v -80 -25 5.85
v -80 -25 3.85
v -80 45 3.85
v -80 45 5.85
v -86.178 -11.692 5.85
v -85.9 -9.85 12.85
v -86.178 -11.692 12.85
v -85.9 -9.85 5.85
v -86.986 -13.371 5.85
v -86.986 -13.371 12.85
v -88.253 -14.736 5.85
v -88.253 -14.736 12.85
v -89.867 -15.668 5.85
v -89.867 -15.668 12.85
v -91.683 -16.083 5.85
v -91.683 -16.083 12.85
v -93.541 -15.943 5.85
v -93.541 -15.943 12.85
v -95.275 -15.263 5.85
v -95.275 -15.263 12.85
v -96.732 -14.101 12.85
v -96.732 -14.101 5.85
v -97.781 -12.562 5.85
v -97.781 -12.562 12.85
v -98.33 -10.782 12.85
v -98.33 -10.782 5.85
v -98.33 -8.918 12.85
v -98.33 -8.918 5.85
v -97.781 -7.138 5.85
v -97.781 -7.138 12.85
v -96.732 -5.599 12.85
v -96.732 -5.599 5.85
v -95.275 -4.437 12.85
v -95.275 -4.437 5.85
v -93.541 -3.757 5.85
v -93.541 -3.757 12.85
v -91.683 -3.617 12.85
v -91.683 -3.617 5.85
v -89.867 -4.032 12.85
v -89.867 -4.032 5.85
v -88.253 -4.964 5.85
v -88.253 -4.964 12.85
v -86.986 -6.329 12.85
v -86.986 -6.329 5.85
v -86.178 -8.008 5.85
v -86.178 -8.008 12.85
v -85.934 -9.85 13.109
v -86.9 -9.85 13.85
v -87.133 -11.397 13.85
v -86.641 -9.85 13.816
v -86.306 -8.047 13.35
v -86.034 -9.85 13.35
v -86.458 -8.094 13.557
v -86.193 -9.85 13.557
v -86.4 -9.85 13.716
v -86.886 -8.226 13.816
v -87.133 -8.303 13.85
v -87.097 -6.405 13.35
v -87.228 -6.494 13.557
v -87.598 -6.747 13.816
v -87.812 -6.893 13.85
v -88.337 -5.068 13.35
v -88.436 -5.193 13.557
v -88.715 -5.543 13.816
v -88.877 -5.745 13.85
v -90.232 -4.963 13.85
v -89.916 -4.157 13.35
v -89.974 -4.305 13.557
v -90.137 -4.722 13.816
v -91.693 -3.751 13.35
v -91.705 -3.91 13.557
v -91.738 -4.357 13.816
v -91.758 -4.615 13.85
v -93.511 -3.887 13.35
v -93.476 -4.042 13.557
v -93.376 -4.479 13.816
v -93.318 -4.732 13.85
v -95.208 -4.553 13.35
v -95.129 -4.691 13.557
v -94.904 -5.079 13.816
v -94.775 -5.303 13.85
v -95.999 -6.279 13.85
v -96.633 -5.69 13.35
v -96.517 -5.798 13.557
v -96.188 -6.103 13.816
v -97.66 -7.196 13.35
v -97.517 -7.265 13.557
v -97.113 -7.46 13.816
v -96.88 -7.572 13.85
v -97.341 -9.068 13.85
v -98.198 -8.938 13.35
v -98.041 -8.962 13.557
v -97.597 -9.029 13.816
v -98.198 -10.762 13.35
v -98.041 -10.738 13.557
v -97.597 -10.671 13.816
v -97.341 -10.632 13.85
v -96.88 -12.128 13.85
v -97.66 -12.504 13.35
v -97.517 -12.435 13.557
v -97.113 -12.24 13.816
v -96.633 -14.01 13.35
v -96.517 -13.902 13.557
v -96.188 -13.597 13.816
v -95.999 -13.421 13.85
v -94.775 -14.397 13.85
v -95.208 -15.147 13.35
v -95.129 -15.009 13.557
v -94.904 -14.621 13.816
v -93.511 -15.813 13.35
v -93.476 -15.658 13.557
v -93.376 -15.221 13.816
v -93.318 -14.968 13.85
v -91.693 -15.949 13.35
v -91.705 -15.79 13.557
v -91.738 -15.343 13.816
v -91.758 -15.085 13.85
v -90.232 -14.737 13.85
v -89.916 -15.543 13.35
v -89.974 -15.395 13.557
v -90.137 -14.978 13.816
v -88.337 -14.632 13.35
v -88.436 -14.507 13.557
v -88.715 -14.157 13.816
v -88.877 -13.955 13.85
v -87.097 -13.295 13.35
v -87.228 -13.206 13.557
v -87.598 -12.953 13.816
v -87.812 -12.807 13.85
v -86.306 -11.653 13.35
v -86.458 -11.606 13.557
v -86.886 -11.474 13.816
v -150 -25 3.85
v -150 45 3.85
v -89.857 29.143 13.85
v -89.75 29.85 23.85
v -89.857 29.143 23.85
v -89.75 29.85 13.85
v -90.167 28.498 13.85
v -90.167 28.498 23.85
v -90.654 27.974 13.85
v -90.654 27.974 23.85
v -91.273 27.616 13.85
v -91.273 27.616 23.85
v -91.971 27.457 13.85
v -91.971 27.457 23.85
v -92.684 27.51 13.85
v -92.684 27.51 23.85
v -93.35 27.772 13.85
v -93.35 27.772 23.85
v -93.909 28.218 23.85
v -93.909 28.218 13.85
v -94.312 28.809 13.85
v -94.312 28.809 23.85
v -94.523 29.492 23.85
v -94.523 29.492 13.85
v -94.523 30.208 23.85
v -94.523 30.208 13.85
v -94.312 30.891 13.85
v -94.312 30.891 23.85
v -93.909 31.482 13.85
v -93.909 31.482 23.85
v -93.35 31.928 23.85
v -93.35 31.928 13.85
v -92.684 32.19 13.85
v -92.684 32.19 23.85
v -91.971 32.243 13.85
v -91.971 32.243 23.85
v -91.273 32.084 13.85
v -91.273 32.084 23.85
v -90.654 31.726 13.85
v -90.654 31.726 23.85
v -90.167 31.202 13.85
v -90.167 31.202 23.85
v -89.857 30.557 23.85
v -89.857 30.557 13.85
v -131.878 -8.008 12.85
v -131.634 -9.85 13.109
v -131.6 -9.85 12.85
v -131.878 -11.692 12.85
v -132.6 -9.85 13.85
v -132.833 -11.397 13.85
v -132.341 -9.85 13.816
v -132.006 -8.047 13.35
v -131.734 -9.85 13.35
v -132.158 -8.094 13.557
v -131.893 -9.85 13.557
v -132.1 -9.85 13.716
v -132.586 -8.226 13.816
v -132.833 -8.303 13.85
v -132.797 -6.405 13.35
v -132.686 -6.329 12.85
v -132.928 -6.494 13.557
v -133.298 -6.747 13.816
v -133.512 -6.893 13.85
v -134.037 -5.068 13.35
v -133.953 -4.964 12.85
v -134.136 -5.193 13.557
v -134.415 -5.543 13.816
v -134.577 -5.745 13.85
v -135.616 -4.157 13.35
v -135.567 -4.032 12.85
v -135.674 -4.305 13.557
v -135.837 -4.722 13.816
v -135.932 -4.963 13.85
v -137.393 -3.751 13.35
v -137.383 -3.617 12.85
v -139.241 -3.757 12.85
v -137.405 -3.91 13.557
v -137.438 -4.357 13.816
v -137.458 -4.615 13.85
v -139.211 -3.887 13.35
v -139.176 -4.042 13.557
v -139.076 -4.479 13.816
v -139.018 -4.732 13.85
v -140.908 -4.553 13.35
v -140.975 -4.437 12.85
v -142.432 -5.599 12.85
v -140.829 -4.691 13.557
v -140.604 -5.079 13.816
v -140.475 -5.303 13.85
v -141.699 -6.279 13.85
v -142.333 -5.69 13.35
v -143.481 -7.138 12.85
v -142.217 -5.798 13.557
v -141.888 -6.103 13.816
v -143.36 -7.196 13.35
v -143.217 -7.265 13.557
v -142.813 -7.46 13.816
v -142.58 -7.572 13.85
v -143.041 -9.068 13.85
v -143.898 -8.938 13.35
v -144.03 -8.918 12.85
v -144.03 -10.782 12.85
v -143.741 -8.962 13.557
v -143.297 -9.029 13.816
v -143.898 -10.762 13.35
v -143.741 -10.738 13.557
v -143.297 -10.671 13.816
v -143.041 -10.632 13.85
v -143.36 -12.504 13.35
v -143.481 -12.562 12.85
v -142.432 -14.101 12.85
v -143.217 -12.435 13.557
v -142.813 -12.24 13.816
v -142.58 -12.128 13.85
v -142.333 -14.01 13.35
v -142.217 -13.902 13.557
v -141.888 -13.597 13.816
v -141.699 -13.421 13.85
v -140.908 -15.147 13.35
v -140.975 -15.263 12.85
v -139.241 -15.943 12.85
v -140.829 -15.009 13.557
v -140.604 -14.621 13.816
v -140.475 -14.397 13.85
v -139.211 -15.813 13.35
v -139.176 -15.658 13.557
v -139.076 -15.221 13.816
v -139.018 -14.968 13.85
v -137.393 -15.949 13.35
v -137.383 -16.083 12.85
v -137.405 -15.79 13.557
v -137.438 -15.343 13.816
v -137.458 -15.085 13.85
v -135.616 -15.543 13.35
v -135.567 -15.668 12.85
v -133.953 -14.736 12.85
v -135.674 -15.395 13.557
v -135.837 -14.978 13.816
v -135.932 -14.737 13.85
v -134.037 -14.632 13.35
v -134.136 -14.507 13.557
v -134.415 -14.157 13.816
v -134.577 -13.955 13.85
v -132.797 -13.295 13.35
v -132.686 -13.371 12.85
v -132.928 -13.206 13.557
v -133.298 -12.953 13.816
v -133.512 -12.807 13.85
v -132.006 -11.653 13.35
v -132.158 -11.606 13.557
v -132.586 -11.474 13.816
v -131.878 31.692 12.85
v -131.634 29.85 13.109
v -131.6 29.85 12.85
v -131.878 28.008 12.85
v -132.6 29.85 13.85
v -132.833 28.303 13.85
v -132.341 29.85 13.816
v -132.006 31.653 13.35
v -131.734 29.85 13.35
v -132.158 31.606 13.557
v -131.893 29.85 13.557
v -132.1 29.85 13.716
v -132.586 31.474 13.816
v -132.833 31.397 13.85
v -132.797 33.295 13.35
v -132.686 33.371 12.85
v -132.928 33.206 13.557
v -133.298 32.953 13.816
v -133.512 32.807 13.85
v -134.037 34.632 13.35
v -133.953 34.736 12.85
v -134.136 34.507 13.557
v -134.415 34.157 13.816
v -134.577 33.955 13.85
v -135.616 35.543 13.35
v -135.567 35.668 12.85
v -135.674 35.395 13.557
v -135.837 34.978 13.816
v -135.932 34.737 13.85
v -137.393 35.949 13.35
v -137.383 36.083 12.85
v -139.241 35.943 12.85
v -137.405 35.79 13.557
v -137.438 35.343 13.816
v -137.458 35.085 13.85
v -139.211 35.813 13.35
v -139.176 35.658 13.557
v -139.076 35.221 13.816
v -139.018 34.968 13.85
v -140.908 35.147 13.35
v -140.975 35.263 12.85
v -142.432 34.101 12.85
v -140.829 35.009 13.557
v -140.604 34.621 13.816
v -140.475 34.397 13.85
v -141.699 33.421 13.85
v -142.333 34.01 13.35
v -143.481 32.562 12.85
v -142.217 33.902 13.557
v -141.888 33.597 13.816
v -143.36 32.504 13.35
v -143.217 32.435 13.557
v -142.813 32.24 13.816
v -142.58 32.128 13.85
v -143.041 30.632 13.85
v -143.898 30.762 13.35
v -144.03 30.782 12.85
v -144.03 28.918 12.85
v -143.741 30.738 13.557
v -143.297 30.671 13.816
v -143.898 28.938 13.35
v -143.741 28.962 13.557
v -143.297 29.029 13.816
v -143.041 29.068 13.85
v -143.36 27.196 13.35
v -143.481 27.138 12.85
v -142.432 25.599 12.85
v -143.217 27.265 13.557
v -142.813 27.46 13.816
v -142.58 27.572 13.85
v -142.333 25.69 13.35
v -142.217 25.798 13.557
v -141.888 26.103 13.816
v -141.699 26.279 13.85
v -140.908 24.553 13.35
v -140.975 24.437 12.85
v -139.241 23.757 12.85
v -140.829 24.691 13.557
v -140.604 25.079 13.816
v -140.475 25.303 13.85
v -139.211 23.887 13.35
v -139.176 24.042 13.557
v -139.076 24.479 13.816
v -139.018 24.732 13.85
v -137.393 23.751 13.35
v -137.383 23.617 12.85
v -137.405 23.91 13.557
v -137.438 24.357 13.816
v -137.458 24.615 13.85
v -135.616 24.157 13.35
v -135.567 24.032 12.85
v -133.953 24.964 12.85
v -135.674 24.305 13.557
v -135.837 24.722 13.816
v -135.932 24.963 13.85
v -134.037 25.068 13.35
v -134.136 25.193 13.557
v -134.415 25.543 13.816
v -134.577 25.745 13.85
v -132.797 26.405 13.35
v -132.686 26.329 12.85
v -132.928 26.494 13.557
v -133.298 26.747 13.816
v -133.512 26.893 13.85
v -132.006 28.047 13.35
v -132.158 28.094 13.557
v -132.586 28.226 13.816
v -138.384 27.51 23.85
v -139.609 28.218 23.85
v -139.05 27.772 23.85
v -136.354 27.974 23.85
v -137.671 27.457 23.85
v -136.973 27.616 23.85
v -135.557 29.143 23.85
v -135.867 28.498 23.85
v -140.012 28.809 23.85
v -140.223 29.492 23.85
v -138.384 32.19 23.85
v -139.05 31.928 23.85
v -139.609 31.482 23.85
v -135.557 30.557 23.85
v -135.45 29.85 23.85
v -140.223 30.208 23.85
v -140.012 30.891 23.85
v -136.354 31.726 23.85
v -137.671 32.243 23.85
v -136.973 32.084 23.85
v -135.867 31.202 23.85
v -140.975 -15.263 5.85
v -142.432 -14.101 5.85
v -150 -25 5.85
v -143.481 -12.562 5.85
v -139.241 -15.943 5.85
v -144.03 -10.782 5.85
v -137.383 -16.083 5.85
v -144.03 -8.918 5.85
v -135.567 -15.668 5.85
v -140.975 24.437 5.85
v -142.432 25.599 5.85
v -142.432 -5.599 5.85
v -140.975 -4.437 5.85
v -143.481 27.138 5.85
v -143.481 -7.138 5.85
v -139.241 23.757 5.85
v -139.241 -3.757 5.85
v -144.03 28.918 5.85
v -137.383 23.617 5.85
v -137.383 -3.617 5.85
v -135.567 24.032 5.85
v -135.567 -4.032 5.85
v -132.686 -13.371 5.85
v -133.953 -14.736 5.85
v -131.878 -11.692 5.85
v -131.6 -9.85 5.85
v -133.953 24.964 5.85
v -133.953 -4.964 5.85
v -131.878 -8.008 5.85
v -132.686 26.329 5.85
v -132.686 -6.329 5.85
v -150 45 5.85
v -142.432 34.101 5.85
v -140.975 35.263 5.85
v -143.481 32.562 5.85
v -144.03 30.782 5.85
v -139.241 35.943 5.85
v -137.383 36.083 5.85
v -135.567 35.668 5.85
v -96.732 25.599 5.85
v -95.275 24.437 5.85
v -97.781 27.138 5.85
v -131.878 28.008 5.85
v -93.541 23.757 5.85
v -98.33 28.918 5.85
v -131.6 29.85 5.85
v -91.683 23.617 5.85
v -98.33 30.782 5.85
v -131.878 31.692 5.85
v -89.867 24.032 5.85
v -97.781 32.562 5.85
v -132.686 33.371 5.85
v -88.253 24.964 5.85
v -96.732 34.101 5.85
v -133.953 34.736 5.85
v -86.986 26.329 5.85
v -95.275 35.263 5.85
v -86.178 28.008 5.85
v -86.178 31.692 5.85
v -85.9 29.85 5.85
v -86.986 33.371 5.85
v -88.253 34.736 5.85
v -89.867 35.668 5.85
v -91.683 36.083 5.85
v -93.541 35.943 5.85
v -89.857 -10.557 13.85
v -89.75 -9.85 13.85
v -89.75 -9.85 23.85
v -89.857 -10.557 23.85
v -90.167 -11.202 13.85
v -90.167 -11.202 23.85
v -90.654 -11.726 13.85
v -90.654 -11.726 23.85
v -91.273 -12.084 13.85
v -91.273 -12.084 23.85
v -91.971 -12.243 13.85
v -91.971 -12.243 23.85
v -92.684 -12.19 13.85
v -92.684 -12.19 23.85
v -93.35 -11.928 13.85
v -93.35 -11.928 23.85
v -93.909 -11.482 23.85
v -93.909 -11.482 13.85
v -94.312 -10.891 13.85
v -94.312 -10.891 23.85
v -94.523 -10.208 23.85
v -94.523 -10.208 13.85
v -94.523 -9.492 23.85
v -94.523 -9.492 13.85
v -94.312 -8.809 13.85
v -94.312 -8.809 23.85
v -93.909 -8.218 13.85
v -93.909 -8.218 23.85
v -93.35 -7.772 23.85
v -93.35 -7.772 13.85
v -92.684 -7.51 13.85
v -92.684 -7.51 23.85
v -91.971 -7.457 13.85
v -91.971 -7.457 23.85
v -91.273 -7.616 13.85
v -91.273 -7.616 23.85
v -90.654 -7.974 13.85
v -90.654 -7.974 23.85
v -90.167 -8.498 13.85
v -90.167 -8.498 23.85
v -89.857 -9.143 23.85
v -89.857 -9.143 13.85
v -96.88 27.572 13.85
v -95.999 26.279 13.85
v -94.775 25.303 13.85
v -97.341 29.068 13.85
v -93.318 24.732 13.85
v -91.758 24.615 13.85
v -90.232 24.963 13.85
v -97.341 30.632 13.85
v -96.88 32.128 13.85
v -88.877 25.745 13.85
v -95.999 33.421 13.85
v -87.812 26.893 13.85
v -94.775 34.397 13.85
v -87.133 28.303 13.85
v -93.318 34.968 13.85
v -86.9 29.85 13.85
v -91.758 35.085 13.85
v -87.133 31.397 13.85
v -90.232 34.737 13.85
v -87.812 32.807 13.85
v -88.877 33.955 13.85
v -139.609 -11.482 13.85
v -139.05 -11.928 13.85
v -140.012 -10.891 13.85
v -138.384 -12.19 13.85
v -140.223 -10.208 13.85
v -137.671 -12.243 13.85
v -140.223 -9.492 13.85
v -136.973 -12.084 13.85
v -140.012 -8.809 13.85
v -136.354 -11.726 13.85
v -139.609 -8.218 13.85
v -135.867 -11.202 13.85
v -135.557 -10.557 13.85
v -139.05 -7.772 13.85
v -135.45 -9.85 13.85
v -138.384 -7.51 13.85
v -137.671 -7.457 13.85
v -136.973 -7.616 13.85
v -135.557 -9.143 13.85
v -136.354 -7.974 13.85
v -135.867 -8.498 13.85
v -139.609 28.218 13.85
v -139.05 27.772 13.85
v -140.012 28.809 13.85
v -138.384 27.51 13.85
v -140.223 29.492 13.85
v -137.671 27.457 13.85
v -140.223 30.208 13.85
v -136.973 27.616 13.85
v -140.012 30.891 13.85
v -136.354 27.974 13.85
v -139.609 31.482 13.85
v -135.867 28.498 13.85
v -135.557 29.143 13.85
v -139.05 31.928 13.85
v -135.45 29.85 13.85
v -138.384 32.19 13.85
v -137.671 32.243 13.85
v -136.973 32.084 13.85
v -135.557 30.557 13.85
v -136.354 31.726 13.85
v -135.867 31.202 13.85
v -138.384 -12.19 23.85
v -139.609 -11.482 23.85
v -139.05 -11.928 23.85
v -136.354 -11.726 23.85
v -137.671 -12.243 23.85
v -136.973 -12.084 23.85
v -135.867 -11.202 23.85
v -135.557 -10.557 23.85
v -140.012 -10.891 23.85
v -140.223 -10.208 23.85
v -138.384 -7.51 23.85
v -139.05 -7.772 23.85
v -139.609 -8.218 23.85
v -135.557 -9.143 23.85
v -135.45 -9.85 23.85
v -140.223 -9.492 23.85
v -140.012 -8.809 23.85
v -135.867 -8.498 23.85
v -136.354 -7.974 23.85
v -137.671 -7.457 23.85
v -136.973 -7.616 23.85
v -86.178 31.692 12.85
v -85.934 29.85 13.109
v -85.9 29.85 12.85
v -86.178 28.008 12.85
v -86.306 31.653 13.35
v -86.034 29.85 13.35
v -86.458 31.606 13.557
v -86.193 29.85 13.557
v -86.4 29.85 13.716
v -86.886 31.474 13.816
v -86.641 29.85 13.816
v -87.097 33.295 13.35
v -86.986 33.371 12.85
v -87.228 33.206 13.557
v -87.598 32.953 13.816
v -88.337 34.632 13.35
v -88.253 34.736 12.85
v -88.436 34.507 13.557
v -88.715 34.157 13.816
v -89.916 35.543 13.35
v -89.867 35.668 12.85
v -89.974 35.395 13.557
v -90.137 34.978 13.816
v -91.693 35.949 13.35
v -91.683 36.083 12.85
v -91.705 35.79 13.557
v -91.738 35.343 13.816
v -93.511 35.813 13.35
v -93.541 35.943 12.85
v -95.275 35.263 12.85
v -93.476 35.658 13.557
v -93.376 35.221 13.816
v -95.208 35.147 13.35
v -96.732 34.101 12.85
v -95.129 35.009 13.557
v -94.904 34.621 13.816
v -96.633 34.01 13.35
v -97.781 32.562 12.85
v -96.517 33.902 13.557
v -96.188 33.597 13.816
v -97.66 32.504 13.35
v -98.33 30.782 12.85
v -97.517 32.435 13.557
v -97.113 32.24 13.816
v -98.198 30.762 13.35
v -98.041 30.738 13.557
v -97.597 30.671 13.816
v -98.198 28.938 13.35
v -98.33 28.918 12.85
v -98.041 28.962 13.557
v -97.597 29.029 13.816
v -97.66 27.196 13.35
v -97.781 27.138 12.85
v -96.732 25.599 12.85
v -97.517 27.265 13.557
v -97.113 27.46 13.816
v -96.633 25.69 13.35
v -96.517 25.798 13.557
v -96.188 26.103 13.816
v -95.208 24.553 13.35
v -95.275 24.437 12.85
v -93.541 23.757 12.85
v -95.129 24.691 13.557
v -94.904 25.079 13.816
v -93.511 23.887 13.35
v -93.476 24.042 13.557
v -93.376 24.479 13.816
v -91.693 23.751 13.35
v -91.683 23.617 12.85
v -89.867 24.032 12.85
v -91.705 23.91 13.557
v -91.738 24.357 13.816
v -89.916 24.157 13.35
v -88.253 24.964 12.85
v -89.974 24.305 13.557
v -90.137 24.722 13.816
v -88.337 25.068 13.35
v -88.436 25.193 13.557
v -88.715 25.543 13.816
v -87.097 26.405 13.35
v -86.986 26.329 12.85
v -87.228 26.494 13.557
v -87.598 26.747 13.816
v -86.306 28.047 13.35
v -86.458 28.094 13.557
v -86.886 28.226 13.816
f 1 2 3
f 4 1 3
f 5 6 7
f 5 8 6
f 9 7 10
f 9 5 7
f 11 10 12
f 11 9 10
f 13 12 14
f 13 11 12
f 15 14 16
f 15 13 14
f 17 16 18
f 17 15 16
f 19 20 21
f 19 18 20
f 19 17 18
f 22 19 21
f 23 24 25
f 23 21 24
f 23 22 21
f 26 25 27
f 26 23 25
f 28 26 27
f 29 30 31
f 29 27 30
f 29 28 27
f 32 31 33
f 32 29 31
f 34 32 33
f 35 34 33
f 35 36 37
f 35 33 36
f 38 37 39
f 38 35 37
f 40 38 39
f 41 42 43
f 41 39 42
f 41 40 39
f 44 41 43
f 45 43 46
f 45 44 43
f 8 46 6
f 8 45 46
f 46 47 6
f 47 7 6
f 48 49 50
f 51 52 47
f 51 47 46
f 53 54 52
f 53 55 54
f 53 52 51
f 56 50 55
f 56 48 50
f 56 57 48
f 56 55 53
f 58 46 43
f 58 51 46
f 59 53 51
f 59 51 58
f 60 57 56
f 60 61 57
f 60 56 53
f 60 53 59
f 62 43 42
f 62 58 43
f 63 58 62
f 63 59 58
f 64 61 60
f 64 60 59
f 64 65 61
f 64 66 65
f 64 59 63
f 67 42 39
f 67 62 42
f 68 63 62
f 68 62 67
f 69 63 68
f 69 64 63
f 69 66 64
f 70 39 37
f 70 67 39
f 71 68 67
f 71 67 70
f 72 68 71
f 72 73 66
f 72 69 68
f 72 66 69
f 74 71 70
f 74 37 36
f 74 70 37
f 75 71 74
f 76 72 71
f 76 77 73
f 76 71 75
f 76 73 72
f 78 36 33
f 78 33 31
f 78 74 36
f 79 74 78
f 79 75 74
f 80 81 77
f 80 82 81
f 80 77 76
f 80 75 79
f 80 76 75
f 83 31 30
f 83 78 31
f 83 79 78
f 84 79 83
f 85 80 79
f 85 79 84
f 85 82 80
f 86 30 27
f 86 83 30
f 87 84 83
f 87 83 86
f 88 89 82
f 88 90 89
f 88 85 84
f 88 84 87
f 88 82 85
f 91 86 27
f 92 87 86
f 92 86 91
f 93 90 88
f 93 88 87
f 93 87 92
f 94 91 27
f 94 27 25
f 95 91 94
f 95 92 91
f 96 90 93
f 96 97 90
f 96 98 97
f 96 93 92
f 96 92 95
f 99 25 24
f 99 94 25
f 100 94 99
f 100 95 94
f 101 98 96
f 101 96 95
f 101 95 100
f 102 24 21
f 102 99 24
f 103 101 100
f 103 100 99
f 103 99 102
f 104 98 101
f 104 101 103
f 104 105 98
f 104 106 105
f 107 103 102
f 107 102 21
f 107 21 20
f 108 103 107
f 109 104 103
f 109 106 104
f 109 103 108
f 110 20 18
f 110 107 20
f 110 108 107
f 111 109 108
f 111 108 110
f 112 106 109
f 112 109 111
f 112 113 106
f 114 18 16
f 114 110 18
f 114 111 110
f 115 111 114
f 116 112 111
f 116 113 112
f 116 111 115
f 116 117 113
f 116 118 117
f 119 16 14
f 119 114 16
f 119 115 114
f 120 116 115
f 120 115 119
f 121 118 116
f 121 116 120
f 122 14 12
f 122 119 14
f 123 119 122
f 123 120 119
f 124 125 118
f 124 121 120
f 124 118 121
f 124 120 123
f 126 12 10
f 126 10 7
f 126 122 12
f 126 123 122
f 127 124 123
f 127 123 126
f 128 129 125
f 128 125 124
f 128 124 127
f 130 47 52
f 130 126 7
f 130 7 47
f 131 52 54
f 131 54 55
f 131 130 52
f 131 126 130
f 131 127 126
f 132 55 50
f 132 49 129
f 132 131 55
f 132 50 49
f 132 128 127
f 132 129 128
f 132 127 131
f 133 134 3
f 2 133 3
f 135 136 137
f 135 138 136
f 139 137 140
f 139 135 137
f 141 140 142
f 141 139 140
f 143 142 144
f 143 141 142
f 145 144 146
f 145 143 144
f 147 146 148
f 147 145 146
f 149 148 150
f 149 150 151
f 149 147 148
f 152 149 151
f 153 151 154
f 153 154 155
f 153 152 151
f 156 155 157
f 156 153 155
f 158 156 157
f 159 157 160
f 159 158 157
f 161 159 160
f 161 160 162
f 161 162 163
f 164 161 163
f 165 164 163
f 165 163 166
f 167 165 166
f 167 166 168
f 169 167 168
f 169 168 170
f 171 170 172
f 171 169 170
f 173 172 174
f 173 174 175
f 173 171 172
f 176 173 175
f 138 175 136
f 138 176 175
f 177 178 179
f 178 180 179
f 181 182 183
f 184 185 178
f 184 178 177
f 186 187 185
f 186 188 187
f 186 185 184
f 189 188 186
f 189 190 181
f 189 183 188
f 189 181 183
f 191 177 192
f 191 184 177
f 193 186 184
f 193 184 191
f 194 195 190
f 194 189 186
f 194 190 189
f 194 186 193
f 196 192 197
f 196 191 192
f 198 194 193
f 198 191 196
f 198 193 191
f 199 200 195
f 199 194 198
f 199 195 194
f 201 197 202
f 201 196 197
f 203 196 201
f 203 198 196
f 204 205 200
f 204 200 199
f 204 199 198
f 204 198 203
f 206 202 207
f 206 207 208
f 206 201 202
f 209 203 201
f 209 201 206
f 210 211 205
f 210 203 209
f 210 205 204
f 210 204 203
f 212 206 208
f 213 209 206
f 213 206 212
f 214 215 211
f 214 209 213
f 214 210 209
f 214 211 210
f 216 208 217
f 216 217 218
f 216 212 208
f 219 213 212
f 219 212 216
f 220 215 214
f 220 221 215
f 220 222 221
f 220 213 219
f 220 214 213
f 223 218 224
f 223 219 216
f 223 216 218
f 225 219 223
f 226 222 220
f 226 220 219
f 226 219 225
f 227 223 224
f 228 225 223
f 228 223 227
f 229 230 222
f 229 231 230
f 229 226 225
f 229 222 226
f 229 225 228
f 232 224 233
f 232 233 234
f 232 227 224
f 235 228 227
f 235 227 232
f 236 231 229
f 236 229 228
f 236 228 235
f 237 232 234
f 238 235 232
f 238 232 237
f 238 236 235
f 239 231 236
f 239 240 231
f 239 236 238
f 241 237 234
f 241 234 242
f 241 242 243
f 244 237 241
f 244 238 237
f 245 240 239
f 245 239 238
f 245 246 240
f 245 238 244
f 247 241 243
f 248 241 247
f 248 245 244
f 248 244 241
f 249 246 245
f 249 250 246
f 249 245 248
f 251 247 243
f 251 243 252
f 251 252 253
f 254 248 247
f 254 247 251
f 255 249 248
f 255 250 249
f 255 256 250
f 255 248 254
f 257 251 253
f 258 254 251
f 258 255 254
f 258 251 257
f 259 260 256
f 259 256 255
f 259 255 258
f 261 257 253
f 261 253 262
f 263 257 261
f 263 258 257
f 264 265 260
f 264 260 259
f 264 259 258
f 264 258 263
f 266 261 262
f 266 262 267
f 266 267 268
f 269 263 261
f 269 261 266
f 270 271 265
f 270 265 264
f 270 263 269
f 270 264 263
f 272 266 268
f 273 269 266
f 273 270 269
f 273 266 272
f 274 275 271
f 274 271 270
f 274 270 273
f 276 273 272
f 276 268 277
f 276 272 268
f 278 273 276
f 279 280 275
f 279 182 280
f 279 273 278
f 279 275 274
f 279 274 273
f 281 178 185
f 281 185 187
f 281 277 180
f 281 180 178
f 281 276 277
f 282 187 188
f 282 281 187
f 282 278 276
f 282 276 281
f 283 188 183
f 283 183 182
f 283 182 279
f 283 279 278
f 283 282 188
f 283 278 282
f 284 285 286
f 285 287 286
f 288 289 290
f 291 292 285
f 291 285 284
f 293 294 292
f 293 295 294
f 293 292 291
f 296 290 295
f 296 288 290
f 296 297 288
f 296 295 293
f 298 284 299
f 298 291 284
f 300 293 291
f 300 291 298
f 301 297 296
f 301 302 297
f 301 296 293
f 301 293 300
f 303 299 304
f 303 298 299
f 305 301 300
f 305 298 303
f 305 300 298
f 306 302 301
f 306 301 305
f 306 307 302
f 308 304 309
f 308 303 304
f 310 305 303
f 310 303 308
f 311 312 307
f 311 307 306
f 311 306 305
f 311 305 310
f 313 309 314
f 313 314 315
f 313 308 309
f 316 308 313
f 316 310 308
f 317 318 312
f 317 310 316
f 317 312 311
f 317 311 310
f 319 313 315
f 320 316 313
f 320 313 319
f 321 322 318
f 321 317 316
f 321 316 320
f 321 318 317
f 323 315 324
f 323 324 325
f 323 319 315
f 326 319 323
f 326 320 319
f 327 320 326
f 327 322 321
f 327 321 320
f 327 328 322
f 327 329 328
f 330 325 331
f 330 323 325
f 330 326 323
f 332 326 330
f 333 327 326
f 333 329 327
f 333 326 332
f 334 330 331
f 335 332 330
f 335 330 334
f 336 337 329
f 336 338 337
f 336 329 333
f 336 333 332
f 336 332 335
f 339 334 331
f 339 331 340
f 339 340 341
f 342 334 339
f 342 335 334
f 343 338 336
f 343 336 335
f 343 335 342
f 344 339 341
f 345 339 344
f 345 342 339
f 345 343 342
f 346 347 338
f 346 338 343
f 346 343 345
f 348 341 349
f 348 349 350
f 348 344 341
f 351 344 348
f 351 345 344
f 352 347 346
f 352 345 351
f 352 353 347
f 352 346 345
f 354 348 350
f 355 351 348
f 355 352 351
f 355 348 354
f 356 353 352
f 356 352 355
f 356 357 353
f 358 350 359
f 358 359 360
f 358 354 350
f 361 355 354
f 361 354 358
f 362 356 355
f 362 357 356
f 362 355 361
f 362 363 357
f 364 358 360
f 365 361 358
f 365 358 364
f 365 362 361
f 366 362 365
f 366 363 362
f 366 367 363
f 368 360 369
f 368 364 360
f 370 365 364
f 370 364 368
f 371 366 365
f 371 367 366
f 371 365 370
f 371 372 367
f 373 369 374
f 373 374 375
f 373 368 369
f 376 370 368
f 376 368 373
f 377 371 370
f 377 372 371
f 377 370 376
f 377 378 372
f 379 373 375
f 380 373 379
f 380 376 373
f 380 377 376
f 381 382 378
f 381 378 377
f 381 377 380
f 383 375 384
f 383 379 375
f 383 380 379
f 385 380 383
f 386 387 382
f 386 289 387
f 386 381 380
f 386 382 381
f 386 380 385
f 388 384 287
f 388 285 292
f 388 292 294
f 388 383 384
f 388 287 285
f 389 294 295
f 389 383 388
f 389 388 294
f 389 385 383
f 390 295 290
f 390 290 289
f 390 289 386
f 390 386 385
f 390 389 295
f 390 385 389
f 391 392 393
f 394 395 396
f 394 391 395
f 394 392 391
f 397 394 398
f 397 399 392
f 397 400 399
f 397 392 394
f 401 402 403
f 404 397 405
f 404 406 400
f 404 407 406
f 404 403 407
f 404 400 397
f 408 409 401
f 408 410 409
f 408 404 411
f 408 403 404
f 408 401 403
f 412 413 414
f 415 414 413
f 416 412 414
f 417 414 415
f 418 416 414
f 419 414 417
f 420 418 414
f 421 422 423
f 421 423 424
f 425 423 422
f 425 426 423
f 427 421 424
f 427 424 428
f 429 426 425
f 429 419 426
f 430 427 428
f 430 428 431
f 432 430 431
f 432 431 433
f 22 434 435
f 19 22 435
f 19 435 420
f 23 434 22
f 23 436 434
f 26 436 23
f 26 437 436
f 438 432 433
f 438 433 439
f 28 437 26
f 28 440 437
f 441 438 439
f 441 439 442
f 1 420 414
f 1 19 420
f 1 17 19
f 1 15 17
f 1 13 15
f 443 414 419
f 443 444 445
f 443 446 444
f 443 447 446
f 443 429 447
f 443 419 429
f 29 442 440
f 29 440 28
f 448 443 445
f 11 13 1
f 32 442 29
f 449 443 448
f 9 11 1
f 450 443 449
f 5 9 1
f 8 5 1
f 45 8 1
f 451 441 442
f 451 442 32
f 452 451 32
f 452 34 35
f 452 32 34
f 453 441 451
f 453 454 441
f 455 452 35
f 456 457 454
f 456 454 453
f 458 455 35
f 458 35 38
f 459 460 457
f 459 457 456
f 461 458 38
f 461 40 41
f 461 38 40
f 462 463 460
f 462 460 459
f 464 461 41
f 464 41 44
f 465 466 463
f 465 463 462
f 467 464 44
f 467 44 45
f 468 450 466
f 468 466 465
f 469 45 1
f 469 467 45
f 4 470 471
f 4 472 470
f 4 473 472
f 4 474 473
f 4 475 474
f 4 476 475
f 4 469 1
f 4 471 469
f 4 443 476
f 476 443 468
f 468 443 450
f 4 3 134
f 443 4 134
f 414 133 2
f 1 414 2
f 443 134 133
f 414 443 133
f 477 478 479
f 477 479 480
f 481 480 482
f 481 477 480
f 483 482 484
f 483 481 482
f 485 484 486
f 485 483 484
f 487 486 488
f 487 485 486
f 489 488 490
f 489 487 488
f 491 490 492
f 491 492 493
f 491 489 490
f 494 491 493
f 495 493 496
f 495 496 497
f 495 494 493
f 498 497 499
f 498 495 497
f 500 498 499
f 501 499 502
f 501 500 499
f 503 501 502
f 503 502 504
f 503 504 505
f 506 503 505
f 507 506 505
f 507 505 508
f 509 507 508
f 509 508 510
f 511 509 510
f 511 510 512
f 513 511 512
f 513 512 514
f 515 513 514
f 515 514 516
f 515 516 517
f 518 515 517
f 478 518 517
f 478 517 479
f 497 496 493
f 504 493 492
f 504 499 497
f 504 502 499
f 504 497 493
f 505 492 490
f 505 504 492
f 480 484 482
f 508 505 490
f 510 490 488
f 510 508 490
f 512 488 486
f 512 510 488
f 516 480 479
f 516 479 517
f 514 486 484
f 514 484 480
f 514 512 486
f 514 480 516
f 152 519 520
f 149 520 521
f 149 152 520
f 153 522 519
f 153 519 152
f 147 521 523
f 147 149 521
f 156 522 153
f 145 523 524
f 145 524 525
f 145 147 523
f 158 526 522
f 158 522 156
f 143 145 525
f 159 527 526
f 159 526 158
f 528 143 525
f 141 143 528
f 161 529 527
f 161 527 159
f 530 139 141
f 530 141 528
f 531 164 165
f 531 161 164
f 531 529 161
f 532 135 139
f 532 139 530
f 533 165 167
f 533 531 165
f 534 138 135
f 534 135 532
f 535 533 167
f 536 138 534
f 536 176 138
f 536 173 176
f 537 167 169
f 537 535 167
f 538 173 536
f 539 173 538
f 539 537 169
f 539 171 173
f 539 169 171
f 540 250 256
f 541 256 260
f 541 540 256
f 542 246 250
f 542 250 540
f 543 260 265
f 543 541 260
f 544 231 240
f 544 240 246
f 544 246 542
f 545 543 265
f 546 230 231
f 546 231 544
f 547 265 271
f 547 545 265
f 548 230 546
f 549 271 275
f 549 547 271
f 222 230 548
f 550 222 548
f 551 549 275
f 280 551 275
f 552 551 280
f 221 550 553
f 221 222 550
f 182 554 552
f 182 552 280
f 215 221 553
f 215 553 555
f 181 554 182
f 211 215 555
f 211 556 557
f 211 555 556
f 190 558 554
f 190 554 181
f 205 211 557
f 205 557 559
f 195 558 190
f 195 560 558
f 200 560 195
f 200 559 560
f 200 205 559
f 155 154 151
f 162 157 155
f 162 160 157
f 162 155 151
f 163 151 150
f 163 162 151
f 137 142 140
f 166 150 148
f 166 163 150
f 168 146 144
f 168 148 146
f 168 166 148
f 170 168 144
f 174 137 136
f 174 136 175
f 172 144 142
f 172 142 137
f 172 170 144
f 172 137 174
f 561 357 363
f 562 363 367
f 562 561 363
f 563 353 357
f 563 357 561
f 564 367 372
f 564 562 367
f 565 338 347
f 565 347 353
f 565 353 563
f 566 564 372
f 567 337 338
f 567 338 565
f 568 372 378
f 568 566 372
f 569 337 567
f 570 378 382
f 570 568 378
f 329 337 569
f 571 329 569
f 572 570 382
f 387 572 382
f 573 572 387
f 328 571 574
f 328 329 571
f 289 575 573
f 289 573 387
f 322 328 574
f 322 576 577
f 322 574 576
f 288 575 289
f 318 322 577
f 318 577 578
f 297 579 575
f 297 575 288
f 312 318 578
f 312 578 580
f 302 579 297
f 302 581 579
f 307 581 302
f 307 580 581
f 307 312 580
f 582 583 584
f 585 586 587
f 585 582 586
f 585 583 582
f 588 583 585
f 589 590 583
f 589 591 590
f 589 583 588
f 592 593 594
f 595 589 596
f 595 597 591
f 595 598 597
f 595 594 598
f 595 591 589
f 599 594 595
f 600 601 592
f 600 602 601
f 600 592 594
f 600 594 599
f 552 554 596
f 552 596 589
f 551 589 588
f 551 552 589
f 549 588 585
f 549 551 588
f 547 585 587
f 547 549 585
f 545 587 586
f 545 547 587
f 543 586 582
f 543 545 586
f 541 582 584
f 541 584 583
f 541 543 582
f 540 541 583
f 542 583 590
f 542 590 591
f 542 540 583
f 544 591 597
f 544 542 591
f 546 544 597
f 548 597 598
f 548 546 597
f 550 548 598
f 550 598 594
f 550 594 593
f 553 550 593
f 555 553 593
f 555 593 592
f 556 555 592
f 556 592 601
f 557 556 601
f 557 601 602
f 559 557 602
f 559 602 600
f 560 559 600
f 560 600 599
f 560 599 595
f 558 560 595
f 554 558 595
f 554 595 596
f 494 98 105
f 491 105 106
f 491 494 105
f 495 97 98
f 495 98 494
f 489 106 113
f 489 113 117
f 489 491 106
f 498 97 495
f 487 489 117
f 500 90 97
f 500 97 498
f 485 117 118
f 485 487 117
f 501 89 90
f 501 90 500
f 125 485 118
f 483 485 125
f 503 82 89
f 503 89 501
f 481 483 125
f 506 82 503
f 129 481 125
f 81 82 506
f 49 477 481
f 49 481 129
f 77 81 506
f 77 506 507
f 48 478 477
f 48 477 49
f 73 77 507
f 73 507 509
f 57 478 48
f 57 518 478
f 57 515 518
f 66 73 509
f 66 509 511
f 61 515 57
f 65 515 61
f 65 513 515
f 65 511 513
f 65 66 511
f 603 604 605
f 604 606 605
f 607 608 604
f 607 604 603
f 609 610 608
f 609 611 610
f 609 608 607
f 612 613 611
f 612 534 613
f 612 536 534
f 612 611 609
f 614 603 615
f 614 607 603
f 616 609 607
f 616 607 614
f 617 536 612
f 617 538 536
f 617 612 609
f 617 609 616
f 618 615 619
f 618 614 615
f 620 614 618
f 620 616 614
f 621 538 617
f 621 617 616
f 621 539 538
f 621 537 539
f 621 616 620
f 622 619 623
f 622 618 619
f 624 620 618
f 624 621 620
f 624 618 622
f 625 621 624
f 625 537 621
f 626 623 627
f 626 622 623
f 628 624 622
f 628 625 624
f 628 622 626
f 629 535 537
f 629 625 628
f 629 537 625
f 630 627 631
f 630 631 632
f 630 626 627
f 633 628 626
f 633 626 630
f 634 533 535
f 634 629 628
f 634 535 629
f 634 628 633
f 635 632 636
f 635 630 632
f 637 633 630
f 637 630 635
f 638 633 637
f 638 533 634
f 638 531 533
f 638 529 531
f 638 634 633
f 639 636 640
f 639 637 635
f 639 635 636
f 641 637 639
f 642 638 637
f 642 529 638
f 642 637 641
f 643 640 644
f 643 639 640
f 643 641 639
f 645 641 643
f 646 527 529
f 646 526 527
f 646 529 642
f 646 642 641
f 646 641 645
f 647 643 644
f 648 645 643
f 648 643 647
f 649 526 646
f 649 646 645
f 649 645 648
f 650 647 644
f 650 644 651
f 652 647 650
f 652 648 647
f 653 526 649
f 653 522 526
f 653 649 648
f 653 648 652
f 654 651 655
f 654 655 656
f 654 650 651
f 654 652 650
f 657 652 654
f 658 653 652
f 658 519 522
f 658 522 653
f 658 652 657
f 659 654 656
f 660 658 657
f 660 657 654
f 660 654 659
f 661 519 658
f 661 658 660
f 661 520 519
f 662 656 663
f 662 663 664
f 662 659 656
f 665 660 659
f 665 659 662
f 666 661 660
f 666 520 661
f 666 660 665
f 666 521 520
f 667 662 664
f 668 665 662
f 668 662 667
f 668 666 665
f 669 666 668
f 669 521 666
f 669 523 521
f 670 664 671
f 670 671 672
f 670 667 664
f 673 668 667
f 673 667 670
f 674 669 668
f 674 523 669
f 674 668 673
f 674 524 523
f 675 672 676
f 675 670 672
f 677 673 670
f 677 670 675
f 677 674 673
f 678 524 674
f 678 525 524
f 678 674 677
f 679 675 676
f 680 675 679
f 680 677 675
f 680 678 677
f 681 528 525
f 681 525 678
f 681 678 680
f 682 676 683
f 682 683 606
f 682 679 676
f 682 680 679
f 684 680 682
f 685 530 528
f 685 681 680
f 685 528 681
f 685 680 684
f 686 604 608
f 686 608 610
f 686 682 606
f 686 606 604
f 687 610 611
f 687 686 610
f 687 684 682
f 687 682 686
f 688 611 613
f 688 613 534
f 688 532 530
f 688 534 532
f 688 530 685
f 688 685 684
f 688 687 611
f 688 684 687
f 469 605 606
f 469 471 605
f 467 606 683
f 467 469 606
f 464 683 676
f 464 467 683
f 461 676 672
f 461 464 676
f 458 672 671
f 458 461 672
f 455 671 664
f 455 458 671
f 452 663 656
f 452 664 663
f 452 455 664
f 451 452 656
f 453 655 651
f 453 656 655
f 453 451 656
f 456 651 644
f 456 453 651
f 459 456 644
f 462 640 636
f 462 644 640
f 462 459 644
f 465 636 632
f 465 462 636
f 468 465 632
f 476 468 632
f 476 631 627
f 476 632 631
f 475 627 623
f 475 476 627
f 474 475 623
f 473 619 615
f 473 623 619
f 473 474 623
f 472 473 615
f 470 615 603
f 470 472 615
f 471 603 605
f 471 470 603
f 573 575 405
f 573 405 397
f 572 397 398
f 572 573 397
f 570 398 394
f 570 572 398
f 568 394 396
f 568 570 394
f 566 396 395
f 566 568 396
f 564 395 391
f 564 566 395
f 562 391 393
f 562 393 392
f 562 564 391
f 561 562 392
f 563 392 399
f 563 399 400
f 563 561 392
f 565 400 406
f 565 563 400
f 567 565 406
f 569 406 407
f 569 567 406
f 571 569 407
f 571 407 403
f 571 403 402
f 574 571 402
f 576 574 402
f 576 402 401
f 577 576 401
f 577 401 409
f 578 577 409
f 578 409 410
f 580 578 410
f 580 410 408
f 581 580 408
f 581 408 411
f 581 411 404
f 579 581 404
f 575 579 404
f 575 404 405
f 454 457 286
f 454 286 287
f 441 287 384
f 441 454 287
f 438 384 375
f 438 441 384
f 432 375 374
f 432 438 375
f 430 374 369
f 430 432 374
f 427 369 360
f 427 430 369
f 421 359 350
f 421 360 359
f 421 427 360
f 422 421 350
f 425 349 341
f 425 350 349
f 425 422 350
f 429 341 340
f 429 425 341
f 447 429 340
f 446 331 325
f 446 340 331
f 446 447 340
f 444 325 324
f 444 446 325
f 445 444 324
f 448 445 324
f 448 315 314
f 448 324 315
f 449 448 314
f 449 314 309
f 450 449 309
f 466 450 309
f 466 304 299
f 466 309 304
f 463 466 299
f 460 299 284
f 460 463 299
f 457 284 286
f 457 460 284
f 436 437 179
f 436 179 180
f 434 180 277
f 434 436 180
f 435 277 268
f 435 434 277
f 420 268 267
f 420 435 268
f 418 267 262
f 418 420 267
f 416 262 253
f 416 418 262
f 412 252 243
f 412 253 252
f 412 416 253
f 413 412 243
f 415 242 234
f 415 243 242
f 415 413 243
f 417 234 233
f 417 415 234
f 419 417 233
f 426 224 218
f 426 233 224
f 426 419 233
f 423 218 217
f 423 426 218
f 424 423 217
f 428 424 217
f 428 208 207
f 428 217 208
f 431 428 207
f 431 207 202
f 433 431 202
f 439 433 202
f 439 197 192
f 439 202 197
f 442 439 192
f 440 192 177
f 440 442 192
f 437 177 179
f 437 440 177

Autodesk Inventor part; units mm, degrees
ref_plane "YZ Plane" through (0, 0, 0) normal (1, 0, 0) x (0, 1, 0)
ref_plane "XZ Plane" through (0, 0, 0) normal (0, 1, 0) x (-1, 0, 0)
ref_plane "Work Plane1" through (0, 0, 3.85) normal (0, 0, 1) x (1, 0, 0)
sketch "Sketch1" plane through (0, 0, 3.85) normal (0, 0, 1) x (1, 0, 0)
  line L0 (-150, -25) -> (-80, -25)
  line L1 (-80, -25) -> (-80, 45)
  line L2 (-80, 45) -> (-150, 45)
  line L3 (-150, 45) -> (-150, -25)
  circle A0 centre (-10, 10) radius 2.5 projected
  line L4 (-150, 0) -> (-150, 5.1) projected
  line L5 (-150, 14.9) -> (-150, 20) projected
  point P0 (0, 0)
  dimension "d0" = 70
  dimension "d20" = 70
  dimension "d21" = 0
extrude "Extrusion1" add sketch "Sketch1" along normal blind 2 contours L3 L2 L1 L0
sketch "Sketch2" plane through (0, 0, 5.85) normal (0, 0, 1) x (1, 0, 0)
  line L0 (-80, -25) -> (-80, 45) projected
  line L1 (-80, 45) -> (-150, 45) projected
  line L2 (-150, 45) -> (-150, -25) projected
  line L3 (-150, -25) -> (-80, -25) projected
  circle A0 centre (-137.85, -9.85) radius 2.4
  circle A1 centre (-137.85, 29.85) radius 2.4
  circle A2 centre (-92.15, -9.85) radius 2.4
  circle A3 centre (-92.15, 29.85) radius 2.4
  line L4 (-140.25, -12.25) -> (-89.75, -12.25)
  line L5 (-89.75, -12.25) -> (-89.75, 32.25)
  line L6 (-89.75, 32.25) -> (-140.25, 32.25)
  line L7 (-140.25, 32.25) -> (-140.25, -12.25)
  line L8 (-150, -25) -> (-80, 45) construction
  line L9 (-80, -25) -> (-150, 45) construction
  line L10 (-89.75, -12.25) -> (-140.25, 32.25) construction
  line L11 (-140.25, -12.25) -> (-89.75, 32.25) construction
  point P0 (0, 0)
  point P1 (-115, 10)
  dimension "d5" = 4.8
  dimension "d6" = 4.8
  dimension "d7" = 4.8
  dimension "d8" = 4.8
  dimension "d9" = 44.5
  dimension "d10" = 50.5
extrude "Extrusion2" add sketch "Sketch2" along normal blind 18 contours A0 | A1 | A2 | A3
sketch "Sketch3" plane through (0, 0, 5.85) normal (0, 0, 1) x (1, 0, 0)
  circle A0 centre (-92.15, -9.85) radius 2.4 projected
  circle A1 centre (-92.15, 29.85) radius 2.4 projected
  circle A2 centre (-137.85, -9.85) radius 2.4 projected
  circle A3 centre (-137.85, 29.85) radius 2.4 projected
  circle A4 centre (-137.85, -9.85) radius 6.25
  circle A5 centre (-137.85, 29.85) radius 6.25
  circle A6 centre (-92.15, -9.85) radius 6.25
  circle A7 centre (-92.15, 29.85) radius 6.25
  point P0 (0, 0)
  dimension "d13" = 12.5
  dimension "d14" = 12.5
  dimension "d15" = 12.5
  dimension "d16" = 12.5
extrude "Extrusion3" add sketch "Sketch3" along normal blind 8
fillet "Fillet1" radius 1 4 edges at (-144.1, -9.85, 13.85) (-98.4, -9.85, 13.85) (-98.4, 29.85, 13.85) (-144.1, 29.85, 13.85)
equation "\"d20\" = d0"
equation "\"d14\" = d13"
equation "\"d15\" = d13"
equation "\"d16\" = d13"
properties part number "Plateo"
